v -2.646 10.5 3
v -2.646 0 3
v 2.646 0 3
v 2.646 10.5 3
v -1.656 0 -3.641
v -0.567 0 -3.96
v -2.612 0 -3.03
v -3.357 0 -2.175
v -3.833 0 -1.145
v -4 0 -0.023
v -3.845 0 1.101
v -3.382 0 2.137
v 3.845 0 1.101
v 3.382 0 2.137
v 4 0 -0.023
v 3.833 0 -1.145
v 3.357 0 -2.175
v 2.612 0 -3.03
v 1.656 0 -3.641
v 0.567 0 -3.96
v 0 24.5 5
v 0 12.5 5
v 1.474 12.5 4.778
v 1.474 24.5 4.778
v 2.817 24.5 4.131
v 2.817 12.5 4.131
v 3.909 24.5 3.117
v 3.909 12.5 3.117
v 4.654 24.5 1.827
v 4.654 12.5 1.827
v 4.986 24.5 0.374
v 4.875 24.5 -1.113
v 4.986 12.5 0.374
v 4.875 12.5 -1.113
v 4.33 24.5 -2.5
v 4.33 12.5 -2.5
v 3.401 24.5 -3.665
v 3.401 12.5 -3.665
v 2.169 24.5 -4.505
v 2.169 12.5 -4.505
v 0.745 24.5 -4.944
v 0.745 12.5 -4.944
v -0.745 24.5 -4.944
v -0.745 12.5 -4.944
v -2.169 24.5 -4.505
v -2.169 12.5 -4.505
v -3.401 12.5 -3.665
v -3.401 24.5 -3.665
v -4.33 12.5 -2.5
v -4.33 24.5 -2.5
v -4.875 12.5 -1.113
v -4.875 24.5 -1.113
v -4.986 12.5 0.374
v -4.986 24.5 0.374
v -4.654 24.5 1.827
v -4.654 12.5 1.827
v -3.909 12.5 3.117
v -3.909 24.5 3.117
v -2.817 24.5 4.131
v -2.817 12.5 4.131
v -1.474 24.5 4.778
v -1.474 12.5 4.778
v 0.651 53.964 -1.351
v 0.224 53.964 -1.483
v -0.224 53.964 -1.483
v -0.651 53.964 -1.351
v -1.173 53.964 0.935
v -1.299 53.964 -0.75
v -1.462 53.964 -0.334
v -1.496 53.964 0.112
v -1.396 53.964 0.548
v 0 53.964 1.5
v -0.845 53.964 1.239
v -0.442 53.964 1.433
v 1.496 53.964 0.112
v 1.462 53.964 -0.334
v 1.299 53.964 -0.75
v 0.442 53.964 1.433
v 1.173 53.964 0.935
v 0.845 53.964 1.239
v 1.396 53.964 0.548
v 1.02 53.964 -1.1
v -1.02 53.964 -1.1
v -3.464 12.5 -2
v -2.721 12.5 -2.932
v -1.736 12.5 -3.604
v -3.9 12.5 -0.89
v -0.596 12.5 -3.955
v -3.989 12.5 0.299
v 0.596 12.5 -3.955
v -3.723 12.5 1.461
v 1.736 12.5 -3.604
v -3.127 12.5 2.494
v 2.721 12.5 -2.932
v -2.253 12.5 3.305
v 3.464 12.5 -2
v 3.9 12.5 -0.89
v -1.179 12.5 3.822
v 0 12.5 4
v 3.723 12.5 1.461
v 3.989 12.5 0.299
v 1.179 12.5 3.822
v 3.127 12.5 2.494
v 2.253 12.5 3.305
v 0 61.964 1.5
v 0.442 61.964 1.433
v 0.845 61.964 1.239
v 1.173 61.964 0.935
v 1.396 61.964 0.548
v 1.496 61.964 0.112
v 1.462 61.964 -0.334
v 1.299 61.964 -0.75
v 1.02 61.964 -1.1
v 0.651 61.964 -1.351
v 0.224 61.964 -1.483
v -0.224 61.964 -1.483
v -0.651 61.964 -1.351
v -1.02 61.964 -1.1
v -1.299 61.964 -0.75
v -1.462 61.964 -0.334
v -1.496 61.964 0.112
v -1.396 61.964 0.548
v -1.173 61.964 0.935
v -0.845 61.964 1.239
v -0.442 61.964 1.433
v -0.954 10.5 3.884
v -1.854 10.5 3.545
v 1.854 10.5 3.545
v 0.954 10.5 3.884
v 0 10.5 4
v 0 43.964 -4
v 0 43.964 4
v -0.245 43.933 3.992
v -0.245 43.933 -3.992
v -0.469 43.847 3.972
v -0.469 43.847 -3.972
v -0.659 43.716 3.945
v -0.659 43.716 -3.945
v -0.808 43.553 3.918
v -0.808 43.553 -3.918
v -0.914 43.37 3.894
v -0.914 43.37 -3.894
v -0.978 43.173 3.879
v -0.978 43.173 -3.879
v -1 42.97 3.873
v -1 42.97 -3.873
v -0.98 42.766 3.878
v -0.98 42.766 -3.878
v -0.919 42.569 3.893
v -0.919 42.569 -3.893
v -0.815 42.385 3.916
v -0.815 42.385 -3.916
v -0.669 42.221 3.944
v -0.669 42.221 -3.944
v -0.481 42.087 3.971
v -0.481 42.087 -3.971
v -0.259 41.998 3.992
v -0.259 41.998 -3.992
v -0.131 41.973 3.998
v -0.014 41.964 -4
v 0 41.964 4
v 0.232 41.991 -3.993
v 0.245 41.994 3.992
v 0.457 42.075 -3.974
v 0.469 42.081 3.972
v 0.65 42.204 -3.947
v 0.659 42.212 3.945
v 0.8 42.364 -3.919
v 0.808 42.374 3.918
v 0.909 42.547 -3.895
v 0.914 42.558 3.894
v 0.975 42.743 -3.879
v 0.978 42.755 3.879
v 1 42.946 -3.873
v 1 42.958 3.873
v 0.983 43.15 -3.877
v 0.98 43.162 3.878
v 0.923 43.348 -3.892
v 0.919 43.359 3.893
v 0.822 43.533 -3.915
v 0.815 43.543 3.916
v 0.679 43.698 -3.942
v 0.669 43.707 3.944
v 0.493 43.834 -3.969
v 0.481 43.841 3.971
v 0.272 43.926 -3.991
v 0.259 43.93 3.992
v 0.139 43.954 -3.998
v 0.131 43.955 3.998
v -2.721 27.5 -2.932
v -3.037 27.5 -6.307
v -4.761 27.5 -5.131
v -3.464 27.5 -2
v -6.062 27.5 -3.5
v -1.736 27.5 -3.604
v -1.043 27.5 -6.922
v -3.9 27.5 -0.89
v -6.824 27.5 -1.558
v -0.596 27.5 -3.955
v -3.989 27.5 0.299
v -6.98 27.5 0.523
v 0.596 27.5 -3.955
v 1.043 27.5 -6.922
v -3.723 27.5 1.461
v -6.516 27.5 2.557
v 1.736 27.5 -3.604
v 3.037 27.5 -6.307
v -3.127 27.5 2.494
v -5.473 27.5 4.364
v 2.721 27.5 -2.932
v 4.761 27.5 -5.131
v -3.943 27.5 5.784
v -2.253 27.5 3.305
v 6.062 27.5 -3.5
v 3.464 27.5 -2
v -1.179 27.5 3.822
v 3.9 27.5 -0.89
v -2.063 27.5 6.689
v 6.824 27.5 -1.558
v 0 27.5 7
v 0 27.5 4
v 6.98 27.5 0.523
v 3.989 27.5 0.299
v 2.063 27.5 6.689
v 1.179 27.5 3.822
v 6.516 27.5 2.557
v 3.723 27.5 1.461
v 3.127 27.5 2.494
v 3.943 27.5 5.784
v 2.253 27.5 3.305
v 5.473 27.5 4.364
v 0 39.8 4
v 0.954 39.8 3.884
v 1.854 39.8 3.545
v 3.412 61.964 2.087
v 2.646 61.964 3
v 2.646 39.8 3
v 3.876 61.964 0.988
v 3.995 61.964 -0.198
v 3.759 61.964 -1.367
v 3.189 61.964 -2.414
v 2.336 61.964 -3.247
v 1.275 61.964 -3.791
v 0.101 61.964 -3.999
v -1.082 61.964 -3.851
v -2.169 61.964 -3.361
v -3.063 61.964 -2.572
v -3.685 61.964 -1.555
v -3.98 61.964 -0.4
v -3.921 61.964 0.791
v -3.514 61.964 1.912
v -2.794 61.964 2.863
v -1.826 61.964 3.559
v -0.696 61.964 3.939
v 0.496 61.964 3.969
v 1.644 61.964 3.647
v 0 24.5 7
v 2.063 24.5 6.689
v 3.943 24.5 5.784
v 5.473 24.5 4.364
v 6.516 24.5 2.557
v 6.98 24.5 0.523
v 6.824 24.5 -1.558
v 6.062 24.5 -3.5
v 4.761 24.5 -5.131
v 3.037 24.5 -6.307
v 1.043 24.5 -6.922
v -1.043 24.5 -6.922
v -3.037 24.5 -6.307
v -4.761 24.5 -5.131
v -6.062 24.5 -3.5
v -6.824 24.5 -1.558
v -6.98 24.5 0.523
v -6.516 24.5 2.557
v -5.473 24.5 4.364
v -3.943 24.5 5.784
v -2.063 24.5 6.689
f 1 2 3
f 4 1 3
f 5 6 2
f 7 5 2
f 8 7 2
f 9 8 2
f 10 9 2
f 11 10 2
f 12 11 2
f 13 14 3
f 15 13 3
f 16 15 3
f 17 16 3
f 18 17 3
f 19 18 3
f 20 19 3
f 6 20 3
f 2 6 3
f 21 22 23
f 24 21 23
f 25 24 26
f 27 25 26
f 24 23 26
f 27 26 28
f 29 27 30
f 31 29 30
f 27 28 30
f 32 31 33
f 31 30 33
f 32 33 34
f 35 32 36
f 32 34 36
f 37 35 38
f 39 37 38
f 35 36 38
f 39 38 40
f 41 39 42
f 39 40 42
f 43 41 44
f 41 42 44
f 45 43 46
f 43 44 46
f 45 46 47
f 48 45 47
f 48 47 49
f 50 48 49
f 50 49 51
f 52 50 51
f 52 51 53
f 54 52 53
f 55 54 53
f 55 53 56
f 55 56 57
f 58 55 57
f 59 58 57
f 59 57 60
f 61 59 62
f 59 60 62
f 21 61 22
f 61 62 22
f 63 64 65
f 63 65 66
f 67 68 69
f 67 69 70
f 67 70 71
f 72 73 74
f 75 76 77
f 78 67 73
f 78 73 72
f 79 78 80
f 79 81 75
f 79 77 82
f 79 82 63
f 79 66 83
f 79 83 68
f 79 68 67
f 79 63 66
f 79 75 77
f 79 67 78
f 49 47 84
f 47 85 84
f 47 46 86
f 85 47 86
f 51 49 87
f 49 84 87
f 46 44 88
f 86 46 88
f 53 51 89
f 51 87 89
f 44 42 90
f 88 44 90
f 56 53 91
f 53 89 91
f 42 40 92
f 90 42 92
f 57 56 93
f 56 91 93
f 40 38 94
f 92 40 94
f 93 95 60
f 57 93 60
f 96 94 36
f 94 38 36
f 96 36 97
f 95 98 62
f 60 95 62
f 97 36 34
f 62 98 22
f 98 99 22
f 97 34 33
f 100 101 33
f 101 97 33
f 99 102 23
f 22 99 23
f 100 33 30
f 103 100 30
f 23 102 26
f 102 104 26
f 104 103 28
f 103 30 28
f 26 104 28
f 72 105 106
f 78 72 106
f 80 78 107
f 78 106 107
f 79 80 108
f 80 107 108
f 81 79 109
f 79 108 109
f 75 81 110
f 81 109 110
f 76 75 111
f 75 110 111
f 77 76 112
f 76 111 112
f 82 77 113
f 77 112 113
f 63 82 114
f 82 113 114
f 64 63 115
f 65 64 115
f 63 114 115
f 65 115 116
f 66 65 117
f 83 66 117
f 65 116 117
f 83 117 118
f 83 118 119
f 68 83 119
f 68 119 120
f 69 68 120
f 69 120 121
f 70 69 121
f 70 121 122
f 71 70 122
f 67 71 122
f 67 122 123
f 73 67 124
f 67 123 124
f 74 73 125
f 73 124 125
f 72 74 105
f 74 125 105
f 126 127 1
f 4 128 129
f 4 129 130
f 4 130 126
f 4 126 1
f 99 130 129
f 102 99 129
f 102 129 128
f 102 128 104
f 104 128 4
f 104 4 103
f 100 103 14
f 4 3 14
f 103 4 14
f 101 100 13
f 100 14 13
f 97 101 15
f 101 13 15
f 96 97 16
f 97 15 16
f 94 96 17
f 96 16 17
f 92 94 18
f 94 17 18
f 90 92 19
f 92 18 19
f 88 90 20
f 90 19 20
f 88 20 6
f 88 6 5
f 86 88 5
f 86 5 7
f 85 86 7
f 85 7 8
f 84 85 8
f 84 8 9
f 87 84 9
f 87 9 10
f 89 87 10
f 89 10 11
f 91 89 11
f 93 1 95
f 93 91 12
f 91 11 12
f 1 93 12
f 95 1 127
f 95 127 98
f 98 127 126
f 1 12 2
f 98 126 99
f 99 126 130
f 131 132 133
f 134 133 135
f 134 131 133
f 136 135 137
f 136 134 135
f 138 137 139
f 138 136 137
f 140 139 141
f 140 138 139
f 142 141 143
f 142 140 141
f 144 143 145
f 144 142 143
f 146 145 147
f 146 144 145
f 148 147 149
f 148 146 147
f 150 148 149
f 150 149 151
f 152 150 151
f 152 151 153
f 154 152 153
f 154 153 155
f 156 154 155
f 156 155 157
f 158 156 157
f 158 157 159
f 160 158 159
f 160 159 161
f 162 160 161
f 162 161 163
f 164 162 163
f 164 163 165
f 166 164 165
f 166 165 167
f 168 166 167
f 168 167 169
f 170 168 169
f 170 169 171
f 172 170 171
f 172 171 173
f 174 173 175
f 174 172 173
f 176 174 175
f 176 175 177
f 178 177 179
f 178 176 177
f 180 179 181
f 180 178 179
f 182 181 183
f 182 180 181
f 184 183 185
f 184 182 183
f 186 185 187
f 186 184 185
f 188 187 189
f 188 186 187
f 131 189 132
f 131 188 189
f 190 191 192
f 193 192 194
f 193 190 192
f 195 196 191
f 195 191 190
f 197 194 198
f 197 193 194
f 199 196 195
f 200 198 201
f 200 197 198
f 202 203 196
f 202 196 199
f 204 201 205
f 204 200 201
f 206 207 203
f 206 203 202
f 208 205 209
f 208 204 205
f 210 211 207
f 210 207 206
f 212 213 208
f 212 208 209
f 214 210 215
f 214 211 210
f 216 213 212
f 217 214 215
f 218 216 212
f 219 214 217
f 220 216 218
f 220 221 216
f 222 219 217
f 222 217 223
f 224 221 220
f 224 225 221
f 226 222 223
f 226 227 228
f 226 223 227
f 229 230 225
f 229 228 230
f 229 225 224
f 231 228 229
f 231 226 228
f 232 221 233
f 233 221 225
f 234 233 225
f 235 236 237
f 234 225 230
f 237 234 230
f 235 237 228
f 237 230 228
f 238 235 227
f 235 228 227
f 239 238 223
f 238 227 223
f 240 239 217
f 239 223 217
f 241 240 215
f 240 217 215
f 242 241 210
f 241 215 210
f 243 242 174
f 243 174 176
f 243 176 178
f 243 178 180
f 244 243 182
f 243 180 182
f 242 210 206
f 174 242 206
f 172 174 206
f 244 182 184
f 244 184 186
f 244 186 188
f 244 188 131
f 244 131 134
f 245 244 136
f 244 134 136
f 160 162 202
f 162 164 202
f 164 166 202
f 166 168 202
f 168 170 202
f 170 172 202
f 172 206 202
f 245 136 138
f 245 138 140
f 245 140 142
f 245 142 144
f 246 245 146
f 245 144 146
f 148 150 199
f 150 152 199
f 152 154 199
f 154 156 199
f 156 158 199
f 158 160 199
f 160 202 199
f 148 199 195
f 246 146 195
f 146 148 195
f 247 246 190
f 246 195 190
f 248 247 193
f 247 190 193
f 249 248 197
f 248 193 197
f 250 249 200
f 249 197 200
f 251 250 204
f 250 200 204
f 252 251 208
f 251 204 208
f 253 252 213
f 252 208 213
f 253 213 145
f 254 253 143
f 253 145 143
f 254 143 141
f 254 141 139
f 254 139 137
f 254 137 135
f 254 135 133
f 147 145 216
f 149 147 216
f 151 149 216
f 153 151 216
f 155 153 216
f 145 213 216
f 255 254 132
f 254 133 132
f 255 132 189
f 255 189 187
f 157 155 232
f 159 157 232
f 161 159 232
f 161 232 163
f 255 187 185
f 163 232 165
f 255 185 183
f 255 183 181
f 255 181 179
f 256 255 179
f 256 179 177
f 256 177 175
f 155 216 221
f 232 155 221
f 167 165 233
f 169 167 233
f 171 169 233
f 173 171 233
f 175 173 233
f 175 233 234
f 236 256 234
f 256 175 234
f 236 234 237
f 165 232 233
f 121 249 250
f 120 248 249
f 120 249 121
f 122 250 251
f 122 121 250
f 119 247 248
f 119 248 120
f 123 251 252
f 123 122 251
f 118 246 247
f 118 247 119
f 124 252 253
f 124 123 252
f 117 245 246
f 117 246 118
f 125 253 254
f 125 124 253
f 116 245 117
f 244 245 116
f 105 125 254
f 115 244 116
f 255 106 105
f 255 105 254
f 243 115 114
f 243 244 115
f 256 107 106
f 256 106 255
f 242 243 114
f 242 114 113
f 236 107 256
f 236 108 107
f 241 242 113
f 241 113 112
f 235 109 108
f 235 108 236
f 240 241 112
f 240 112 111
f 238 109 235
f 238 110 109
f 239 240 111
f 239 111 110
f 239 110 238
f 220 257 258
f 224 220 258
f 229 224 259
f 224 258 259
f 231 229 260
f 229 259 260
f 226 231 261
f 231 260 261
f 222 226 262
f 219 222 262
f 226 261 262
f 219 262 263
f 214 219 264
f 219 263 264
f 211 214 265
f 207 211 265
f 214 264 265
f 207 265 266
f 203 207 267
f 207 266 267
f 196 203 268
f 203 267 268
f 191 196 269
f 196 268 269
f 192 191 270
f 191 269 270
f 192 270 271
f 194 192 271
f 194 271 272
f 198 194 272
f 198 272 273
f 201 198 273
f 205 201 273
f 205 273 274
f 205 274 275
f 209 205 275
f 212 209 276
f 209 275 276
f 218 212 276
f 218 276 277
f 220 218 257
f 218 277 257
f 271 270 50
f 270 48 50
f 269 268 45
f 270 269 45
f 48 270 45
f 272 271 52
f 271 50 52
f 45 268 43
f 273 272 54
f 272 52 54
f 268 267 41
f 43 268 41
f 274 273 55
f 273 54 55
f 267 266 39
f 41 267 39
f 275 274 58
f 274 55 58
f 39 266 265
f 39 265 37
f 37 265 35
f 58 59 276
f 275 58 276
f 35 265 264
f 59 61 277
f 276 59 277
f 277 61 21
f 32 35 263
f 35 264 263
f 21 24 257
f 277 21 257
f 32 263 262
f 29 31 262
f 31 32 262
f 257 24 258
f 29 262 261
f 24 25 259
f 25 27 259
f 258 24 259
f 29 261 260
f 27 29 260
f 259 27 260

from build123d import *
from build123d.topology import SkipClean

# Parameters (mm, degrees)
SKETCH1_R                    = 4
COUPLER_SECTION_DEPTH        = 12.5
SKETCH3_R                    = 5
BEARING_SECTION_DEPTH        = 12
SKETCH4_R                    = 7
BEARING_STOP_DEPTH           = 3
SKETCH5_R                    = 4
SMALL_SEAL_SECTION_DEPTH     = 12.3
SET_SCREW_FLAT_SECTION_DEPTH = 10.5
SKETCH7_R                    = 4
IMPELLER_SECTION_DEPTH       = 22.163925
SKETCH8_R                    = 1.5
CUT_EXTRUDE1_DEPTH           = 8
CUT_EXTRUDE2_DEPTH           = 23
CUT_EXTRUDE2_DEPTH_BACK      = 23
SKETCH9_R                    = 1


with BuildPart() as part:
    # Sketch1 → coupler section (new body)
    with BuildSketch(Plane(origin=(0, 0, 0), x_dir=(1, 0, 0), z_dir=(0, 1, 0))):
        with Locations(Location((0, 0, 0), (0, 0, 270))):
            Circle(SKETCH1_R)
    extrude(amount=COUPLER_SECTION_DEPTH)

    # Sketch3 → bearing section (add)
    with BuildSketch(Plane(origin=(0, 12.5, 0), x_dir=(1, 0, 0), z_dir=(0, 1, 0))):
        with Locations(Location((0, 0, 0), (0, 0, 270))):
            Circle(SKETCH3_R)
    extrude(amount=BEARING_SECTION_DEPTH)

    # Sketch4 → bearing stop (add)
    with BuildSketch(Plane(origin=(0, 24.5, 0), x_dir=(1, 0, 0), z_dir=(0, 1, 0))):
        with Locations(Location((0, 0, 0), (0, 0, 270))):
            Circle(SKETCH4_R)
    extrude(amount=BEARING_STOP_DEPTH)

    # Sketch5 → small seal section (add)
    with BuildSketch(Plane(origin=(0, 27.5, 0), x_dir=(1, 0, 0), z_dir=(0, 1, 0))):
        with Locations(Location((0, 0, 0), (0, 0, 270))):
            Circle(SKETCH5_R)
    extrude(amount=SMALL_SEAL_SECTION_DEPTH)

    # Sketch6 → set screw flat section (cut)
    with BuildSketch(Plane.XZ):
        with BuildLine():
            Line((-2.645751311, 3), (2.645751311, 3))
            ThreePointArc((2.645751311, 3), (0, 4), (-2.645751311, 3))
        make_face()
    extrude(amount=-SET_SCREW_FLAT_SECTION_DEPTH, mode=Mode.SUBTRACT)

    # Sketch7 → impeller section (add)
    with BuildSketch(Plane(origin=(0, 39.8, 0), x_dir=(1, 0, 0), z_dir=(0, 1, 0))):
        with Locations(Location((0, 0, 0), (0, 0, 311.409622109))):
            Circle(SKETCH7_R)
    extrude(amount=IMPELLER_SECTION_DEPTH)

    # Sketch8 → Cut-Extrude1 (cut)
    with BuildSketch(Plane(origin=(0, 61.963925, 0), x_dir=(1, 0, 0), z_dir=(0, 1, 0))):
        with Locations(Location((0, 0, 0), (0, 0, 270))):
            Circle(SKETCH8_R)
    extrude(amount=-CUT_EXTRUDE1_DEPTH, mode=Mode.SUBTRACT)

    # Sketch9 → Cut-Extrude2 (cut, two sides: drawn at the far end of the back side and taken through both)
    with SkipClean():  # the faces are left unmerged after this step: merging them gives an invalid solid
        with BuildSketch(Plane.XY.offset(-CUT_EXTRUDE2_DEPTH_BACK)):
            with Locations(Location((0, 42.963925, 0), (0, 0, 89.999999996))):
                Circle(SKETCH9_R)
        extrude(amount=CUT_EXTRUDE2_DEPTH + CUT_EXTRUDE2_DEPTH_BACK, mode=Mode.SUBTRACT)


solid = part.part
